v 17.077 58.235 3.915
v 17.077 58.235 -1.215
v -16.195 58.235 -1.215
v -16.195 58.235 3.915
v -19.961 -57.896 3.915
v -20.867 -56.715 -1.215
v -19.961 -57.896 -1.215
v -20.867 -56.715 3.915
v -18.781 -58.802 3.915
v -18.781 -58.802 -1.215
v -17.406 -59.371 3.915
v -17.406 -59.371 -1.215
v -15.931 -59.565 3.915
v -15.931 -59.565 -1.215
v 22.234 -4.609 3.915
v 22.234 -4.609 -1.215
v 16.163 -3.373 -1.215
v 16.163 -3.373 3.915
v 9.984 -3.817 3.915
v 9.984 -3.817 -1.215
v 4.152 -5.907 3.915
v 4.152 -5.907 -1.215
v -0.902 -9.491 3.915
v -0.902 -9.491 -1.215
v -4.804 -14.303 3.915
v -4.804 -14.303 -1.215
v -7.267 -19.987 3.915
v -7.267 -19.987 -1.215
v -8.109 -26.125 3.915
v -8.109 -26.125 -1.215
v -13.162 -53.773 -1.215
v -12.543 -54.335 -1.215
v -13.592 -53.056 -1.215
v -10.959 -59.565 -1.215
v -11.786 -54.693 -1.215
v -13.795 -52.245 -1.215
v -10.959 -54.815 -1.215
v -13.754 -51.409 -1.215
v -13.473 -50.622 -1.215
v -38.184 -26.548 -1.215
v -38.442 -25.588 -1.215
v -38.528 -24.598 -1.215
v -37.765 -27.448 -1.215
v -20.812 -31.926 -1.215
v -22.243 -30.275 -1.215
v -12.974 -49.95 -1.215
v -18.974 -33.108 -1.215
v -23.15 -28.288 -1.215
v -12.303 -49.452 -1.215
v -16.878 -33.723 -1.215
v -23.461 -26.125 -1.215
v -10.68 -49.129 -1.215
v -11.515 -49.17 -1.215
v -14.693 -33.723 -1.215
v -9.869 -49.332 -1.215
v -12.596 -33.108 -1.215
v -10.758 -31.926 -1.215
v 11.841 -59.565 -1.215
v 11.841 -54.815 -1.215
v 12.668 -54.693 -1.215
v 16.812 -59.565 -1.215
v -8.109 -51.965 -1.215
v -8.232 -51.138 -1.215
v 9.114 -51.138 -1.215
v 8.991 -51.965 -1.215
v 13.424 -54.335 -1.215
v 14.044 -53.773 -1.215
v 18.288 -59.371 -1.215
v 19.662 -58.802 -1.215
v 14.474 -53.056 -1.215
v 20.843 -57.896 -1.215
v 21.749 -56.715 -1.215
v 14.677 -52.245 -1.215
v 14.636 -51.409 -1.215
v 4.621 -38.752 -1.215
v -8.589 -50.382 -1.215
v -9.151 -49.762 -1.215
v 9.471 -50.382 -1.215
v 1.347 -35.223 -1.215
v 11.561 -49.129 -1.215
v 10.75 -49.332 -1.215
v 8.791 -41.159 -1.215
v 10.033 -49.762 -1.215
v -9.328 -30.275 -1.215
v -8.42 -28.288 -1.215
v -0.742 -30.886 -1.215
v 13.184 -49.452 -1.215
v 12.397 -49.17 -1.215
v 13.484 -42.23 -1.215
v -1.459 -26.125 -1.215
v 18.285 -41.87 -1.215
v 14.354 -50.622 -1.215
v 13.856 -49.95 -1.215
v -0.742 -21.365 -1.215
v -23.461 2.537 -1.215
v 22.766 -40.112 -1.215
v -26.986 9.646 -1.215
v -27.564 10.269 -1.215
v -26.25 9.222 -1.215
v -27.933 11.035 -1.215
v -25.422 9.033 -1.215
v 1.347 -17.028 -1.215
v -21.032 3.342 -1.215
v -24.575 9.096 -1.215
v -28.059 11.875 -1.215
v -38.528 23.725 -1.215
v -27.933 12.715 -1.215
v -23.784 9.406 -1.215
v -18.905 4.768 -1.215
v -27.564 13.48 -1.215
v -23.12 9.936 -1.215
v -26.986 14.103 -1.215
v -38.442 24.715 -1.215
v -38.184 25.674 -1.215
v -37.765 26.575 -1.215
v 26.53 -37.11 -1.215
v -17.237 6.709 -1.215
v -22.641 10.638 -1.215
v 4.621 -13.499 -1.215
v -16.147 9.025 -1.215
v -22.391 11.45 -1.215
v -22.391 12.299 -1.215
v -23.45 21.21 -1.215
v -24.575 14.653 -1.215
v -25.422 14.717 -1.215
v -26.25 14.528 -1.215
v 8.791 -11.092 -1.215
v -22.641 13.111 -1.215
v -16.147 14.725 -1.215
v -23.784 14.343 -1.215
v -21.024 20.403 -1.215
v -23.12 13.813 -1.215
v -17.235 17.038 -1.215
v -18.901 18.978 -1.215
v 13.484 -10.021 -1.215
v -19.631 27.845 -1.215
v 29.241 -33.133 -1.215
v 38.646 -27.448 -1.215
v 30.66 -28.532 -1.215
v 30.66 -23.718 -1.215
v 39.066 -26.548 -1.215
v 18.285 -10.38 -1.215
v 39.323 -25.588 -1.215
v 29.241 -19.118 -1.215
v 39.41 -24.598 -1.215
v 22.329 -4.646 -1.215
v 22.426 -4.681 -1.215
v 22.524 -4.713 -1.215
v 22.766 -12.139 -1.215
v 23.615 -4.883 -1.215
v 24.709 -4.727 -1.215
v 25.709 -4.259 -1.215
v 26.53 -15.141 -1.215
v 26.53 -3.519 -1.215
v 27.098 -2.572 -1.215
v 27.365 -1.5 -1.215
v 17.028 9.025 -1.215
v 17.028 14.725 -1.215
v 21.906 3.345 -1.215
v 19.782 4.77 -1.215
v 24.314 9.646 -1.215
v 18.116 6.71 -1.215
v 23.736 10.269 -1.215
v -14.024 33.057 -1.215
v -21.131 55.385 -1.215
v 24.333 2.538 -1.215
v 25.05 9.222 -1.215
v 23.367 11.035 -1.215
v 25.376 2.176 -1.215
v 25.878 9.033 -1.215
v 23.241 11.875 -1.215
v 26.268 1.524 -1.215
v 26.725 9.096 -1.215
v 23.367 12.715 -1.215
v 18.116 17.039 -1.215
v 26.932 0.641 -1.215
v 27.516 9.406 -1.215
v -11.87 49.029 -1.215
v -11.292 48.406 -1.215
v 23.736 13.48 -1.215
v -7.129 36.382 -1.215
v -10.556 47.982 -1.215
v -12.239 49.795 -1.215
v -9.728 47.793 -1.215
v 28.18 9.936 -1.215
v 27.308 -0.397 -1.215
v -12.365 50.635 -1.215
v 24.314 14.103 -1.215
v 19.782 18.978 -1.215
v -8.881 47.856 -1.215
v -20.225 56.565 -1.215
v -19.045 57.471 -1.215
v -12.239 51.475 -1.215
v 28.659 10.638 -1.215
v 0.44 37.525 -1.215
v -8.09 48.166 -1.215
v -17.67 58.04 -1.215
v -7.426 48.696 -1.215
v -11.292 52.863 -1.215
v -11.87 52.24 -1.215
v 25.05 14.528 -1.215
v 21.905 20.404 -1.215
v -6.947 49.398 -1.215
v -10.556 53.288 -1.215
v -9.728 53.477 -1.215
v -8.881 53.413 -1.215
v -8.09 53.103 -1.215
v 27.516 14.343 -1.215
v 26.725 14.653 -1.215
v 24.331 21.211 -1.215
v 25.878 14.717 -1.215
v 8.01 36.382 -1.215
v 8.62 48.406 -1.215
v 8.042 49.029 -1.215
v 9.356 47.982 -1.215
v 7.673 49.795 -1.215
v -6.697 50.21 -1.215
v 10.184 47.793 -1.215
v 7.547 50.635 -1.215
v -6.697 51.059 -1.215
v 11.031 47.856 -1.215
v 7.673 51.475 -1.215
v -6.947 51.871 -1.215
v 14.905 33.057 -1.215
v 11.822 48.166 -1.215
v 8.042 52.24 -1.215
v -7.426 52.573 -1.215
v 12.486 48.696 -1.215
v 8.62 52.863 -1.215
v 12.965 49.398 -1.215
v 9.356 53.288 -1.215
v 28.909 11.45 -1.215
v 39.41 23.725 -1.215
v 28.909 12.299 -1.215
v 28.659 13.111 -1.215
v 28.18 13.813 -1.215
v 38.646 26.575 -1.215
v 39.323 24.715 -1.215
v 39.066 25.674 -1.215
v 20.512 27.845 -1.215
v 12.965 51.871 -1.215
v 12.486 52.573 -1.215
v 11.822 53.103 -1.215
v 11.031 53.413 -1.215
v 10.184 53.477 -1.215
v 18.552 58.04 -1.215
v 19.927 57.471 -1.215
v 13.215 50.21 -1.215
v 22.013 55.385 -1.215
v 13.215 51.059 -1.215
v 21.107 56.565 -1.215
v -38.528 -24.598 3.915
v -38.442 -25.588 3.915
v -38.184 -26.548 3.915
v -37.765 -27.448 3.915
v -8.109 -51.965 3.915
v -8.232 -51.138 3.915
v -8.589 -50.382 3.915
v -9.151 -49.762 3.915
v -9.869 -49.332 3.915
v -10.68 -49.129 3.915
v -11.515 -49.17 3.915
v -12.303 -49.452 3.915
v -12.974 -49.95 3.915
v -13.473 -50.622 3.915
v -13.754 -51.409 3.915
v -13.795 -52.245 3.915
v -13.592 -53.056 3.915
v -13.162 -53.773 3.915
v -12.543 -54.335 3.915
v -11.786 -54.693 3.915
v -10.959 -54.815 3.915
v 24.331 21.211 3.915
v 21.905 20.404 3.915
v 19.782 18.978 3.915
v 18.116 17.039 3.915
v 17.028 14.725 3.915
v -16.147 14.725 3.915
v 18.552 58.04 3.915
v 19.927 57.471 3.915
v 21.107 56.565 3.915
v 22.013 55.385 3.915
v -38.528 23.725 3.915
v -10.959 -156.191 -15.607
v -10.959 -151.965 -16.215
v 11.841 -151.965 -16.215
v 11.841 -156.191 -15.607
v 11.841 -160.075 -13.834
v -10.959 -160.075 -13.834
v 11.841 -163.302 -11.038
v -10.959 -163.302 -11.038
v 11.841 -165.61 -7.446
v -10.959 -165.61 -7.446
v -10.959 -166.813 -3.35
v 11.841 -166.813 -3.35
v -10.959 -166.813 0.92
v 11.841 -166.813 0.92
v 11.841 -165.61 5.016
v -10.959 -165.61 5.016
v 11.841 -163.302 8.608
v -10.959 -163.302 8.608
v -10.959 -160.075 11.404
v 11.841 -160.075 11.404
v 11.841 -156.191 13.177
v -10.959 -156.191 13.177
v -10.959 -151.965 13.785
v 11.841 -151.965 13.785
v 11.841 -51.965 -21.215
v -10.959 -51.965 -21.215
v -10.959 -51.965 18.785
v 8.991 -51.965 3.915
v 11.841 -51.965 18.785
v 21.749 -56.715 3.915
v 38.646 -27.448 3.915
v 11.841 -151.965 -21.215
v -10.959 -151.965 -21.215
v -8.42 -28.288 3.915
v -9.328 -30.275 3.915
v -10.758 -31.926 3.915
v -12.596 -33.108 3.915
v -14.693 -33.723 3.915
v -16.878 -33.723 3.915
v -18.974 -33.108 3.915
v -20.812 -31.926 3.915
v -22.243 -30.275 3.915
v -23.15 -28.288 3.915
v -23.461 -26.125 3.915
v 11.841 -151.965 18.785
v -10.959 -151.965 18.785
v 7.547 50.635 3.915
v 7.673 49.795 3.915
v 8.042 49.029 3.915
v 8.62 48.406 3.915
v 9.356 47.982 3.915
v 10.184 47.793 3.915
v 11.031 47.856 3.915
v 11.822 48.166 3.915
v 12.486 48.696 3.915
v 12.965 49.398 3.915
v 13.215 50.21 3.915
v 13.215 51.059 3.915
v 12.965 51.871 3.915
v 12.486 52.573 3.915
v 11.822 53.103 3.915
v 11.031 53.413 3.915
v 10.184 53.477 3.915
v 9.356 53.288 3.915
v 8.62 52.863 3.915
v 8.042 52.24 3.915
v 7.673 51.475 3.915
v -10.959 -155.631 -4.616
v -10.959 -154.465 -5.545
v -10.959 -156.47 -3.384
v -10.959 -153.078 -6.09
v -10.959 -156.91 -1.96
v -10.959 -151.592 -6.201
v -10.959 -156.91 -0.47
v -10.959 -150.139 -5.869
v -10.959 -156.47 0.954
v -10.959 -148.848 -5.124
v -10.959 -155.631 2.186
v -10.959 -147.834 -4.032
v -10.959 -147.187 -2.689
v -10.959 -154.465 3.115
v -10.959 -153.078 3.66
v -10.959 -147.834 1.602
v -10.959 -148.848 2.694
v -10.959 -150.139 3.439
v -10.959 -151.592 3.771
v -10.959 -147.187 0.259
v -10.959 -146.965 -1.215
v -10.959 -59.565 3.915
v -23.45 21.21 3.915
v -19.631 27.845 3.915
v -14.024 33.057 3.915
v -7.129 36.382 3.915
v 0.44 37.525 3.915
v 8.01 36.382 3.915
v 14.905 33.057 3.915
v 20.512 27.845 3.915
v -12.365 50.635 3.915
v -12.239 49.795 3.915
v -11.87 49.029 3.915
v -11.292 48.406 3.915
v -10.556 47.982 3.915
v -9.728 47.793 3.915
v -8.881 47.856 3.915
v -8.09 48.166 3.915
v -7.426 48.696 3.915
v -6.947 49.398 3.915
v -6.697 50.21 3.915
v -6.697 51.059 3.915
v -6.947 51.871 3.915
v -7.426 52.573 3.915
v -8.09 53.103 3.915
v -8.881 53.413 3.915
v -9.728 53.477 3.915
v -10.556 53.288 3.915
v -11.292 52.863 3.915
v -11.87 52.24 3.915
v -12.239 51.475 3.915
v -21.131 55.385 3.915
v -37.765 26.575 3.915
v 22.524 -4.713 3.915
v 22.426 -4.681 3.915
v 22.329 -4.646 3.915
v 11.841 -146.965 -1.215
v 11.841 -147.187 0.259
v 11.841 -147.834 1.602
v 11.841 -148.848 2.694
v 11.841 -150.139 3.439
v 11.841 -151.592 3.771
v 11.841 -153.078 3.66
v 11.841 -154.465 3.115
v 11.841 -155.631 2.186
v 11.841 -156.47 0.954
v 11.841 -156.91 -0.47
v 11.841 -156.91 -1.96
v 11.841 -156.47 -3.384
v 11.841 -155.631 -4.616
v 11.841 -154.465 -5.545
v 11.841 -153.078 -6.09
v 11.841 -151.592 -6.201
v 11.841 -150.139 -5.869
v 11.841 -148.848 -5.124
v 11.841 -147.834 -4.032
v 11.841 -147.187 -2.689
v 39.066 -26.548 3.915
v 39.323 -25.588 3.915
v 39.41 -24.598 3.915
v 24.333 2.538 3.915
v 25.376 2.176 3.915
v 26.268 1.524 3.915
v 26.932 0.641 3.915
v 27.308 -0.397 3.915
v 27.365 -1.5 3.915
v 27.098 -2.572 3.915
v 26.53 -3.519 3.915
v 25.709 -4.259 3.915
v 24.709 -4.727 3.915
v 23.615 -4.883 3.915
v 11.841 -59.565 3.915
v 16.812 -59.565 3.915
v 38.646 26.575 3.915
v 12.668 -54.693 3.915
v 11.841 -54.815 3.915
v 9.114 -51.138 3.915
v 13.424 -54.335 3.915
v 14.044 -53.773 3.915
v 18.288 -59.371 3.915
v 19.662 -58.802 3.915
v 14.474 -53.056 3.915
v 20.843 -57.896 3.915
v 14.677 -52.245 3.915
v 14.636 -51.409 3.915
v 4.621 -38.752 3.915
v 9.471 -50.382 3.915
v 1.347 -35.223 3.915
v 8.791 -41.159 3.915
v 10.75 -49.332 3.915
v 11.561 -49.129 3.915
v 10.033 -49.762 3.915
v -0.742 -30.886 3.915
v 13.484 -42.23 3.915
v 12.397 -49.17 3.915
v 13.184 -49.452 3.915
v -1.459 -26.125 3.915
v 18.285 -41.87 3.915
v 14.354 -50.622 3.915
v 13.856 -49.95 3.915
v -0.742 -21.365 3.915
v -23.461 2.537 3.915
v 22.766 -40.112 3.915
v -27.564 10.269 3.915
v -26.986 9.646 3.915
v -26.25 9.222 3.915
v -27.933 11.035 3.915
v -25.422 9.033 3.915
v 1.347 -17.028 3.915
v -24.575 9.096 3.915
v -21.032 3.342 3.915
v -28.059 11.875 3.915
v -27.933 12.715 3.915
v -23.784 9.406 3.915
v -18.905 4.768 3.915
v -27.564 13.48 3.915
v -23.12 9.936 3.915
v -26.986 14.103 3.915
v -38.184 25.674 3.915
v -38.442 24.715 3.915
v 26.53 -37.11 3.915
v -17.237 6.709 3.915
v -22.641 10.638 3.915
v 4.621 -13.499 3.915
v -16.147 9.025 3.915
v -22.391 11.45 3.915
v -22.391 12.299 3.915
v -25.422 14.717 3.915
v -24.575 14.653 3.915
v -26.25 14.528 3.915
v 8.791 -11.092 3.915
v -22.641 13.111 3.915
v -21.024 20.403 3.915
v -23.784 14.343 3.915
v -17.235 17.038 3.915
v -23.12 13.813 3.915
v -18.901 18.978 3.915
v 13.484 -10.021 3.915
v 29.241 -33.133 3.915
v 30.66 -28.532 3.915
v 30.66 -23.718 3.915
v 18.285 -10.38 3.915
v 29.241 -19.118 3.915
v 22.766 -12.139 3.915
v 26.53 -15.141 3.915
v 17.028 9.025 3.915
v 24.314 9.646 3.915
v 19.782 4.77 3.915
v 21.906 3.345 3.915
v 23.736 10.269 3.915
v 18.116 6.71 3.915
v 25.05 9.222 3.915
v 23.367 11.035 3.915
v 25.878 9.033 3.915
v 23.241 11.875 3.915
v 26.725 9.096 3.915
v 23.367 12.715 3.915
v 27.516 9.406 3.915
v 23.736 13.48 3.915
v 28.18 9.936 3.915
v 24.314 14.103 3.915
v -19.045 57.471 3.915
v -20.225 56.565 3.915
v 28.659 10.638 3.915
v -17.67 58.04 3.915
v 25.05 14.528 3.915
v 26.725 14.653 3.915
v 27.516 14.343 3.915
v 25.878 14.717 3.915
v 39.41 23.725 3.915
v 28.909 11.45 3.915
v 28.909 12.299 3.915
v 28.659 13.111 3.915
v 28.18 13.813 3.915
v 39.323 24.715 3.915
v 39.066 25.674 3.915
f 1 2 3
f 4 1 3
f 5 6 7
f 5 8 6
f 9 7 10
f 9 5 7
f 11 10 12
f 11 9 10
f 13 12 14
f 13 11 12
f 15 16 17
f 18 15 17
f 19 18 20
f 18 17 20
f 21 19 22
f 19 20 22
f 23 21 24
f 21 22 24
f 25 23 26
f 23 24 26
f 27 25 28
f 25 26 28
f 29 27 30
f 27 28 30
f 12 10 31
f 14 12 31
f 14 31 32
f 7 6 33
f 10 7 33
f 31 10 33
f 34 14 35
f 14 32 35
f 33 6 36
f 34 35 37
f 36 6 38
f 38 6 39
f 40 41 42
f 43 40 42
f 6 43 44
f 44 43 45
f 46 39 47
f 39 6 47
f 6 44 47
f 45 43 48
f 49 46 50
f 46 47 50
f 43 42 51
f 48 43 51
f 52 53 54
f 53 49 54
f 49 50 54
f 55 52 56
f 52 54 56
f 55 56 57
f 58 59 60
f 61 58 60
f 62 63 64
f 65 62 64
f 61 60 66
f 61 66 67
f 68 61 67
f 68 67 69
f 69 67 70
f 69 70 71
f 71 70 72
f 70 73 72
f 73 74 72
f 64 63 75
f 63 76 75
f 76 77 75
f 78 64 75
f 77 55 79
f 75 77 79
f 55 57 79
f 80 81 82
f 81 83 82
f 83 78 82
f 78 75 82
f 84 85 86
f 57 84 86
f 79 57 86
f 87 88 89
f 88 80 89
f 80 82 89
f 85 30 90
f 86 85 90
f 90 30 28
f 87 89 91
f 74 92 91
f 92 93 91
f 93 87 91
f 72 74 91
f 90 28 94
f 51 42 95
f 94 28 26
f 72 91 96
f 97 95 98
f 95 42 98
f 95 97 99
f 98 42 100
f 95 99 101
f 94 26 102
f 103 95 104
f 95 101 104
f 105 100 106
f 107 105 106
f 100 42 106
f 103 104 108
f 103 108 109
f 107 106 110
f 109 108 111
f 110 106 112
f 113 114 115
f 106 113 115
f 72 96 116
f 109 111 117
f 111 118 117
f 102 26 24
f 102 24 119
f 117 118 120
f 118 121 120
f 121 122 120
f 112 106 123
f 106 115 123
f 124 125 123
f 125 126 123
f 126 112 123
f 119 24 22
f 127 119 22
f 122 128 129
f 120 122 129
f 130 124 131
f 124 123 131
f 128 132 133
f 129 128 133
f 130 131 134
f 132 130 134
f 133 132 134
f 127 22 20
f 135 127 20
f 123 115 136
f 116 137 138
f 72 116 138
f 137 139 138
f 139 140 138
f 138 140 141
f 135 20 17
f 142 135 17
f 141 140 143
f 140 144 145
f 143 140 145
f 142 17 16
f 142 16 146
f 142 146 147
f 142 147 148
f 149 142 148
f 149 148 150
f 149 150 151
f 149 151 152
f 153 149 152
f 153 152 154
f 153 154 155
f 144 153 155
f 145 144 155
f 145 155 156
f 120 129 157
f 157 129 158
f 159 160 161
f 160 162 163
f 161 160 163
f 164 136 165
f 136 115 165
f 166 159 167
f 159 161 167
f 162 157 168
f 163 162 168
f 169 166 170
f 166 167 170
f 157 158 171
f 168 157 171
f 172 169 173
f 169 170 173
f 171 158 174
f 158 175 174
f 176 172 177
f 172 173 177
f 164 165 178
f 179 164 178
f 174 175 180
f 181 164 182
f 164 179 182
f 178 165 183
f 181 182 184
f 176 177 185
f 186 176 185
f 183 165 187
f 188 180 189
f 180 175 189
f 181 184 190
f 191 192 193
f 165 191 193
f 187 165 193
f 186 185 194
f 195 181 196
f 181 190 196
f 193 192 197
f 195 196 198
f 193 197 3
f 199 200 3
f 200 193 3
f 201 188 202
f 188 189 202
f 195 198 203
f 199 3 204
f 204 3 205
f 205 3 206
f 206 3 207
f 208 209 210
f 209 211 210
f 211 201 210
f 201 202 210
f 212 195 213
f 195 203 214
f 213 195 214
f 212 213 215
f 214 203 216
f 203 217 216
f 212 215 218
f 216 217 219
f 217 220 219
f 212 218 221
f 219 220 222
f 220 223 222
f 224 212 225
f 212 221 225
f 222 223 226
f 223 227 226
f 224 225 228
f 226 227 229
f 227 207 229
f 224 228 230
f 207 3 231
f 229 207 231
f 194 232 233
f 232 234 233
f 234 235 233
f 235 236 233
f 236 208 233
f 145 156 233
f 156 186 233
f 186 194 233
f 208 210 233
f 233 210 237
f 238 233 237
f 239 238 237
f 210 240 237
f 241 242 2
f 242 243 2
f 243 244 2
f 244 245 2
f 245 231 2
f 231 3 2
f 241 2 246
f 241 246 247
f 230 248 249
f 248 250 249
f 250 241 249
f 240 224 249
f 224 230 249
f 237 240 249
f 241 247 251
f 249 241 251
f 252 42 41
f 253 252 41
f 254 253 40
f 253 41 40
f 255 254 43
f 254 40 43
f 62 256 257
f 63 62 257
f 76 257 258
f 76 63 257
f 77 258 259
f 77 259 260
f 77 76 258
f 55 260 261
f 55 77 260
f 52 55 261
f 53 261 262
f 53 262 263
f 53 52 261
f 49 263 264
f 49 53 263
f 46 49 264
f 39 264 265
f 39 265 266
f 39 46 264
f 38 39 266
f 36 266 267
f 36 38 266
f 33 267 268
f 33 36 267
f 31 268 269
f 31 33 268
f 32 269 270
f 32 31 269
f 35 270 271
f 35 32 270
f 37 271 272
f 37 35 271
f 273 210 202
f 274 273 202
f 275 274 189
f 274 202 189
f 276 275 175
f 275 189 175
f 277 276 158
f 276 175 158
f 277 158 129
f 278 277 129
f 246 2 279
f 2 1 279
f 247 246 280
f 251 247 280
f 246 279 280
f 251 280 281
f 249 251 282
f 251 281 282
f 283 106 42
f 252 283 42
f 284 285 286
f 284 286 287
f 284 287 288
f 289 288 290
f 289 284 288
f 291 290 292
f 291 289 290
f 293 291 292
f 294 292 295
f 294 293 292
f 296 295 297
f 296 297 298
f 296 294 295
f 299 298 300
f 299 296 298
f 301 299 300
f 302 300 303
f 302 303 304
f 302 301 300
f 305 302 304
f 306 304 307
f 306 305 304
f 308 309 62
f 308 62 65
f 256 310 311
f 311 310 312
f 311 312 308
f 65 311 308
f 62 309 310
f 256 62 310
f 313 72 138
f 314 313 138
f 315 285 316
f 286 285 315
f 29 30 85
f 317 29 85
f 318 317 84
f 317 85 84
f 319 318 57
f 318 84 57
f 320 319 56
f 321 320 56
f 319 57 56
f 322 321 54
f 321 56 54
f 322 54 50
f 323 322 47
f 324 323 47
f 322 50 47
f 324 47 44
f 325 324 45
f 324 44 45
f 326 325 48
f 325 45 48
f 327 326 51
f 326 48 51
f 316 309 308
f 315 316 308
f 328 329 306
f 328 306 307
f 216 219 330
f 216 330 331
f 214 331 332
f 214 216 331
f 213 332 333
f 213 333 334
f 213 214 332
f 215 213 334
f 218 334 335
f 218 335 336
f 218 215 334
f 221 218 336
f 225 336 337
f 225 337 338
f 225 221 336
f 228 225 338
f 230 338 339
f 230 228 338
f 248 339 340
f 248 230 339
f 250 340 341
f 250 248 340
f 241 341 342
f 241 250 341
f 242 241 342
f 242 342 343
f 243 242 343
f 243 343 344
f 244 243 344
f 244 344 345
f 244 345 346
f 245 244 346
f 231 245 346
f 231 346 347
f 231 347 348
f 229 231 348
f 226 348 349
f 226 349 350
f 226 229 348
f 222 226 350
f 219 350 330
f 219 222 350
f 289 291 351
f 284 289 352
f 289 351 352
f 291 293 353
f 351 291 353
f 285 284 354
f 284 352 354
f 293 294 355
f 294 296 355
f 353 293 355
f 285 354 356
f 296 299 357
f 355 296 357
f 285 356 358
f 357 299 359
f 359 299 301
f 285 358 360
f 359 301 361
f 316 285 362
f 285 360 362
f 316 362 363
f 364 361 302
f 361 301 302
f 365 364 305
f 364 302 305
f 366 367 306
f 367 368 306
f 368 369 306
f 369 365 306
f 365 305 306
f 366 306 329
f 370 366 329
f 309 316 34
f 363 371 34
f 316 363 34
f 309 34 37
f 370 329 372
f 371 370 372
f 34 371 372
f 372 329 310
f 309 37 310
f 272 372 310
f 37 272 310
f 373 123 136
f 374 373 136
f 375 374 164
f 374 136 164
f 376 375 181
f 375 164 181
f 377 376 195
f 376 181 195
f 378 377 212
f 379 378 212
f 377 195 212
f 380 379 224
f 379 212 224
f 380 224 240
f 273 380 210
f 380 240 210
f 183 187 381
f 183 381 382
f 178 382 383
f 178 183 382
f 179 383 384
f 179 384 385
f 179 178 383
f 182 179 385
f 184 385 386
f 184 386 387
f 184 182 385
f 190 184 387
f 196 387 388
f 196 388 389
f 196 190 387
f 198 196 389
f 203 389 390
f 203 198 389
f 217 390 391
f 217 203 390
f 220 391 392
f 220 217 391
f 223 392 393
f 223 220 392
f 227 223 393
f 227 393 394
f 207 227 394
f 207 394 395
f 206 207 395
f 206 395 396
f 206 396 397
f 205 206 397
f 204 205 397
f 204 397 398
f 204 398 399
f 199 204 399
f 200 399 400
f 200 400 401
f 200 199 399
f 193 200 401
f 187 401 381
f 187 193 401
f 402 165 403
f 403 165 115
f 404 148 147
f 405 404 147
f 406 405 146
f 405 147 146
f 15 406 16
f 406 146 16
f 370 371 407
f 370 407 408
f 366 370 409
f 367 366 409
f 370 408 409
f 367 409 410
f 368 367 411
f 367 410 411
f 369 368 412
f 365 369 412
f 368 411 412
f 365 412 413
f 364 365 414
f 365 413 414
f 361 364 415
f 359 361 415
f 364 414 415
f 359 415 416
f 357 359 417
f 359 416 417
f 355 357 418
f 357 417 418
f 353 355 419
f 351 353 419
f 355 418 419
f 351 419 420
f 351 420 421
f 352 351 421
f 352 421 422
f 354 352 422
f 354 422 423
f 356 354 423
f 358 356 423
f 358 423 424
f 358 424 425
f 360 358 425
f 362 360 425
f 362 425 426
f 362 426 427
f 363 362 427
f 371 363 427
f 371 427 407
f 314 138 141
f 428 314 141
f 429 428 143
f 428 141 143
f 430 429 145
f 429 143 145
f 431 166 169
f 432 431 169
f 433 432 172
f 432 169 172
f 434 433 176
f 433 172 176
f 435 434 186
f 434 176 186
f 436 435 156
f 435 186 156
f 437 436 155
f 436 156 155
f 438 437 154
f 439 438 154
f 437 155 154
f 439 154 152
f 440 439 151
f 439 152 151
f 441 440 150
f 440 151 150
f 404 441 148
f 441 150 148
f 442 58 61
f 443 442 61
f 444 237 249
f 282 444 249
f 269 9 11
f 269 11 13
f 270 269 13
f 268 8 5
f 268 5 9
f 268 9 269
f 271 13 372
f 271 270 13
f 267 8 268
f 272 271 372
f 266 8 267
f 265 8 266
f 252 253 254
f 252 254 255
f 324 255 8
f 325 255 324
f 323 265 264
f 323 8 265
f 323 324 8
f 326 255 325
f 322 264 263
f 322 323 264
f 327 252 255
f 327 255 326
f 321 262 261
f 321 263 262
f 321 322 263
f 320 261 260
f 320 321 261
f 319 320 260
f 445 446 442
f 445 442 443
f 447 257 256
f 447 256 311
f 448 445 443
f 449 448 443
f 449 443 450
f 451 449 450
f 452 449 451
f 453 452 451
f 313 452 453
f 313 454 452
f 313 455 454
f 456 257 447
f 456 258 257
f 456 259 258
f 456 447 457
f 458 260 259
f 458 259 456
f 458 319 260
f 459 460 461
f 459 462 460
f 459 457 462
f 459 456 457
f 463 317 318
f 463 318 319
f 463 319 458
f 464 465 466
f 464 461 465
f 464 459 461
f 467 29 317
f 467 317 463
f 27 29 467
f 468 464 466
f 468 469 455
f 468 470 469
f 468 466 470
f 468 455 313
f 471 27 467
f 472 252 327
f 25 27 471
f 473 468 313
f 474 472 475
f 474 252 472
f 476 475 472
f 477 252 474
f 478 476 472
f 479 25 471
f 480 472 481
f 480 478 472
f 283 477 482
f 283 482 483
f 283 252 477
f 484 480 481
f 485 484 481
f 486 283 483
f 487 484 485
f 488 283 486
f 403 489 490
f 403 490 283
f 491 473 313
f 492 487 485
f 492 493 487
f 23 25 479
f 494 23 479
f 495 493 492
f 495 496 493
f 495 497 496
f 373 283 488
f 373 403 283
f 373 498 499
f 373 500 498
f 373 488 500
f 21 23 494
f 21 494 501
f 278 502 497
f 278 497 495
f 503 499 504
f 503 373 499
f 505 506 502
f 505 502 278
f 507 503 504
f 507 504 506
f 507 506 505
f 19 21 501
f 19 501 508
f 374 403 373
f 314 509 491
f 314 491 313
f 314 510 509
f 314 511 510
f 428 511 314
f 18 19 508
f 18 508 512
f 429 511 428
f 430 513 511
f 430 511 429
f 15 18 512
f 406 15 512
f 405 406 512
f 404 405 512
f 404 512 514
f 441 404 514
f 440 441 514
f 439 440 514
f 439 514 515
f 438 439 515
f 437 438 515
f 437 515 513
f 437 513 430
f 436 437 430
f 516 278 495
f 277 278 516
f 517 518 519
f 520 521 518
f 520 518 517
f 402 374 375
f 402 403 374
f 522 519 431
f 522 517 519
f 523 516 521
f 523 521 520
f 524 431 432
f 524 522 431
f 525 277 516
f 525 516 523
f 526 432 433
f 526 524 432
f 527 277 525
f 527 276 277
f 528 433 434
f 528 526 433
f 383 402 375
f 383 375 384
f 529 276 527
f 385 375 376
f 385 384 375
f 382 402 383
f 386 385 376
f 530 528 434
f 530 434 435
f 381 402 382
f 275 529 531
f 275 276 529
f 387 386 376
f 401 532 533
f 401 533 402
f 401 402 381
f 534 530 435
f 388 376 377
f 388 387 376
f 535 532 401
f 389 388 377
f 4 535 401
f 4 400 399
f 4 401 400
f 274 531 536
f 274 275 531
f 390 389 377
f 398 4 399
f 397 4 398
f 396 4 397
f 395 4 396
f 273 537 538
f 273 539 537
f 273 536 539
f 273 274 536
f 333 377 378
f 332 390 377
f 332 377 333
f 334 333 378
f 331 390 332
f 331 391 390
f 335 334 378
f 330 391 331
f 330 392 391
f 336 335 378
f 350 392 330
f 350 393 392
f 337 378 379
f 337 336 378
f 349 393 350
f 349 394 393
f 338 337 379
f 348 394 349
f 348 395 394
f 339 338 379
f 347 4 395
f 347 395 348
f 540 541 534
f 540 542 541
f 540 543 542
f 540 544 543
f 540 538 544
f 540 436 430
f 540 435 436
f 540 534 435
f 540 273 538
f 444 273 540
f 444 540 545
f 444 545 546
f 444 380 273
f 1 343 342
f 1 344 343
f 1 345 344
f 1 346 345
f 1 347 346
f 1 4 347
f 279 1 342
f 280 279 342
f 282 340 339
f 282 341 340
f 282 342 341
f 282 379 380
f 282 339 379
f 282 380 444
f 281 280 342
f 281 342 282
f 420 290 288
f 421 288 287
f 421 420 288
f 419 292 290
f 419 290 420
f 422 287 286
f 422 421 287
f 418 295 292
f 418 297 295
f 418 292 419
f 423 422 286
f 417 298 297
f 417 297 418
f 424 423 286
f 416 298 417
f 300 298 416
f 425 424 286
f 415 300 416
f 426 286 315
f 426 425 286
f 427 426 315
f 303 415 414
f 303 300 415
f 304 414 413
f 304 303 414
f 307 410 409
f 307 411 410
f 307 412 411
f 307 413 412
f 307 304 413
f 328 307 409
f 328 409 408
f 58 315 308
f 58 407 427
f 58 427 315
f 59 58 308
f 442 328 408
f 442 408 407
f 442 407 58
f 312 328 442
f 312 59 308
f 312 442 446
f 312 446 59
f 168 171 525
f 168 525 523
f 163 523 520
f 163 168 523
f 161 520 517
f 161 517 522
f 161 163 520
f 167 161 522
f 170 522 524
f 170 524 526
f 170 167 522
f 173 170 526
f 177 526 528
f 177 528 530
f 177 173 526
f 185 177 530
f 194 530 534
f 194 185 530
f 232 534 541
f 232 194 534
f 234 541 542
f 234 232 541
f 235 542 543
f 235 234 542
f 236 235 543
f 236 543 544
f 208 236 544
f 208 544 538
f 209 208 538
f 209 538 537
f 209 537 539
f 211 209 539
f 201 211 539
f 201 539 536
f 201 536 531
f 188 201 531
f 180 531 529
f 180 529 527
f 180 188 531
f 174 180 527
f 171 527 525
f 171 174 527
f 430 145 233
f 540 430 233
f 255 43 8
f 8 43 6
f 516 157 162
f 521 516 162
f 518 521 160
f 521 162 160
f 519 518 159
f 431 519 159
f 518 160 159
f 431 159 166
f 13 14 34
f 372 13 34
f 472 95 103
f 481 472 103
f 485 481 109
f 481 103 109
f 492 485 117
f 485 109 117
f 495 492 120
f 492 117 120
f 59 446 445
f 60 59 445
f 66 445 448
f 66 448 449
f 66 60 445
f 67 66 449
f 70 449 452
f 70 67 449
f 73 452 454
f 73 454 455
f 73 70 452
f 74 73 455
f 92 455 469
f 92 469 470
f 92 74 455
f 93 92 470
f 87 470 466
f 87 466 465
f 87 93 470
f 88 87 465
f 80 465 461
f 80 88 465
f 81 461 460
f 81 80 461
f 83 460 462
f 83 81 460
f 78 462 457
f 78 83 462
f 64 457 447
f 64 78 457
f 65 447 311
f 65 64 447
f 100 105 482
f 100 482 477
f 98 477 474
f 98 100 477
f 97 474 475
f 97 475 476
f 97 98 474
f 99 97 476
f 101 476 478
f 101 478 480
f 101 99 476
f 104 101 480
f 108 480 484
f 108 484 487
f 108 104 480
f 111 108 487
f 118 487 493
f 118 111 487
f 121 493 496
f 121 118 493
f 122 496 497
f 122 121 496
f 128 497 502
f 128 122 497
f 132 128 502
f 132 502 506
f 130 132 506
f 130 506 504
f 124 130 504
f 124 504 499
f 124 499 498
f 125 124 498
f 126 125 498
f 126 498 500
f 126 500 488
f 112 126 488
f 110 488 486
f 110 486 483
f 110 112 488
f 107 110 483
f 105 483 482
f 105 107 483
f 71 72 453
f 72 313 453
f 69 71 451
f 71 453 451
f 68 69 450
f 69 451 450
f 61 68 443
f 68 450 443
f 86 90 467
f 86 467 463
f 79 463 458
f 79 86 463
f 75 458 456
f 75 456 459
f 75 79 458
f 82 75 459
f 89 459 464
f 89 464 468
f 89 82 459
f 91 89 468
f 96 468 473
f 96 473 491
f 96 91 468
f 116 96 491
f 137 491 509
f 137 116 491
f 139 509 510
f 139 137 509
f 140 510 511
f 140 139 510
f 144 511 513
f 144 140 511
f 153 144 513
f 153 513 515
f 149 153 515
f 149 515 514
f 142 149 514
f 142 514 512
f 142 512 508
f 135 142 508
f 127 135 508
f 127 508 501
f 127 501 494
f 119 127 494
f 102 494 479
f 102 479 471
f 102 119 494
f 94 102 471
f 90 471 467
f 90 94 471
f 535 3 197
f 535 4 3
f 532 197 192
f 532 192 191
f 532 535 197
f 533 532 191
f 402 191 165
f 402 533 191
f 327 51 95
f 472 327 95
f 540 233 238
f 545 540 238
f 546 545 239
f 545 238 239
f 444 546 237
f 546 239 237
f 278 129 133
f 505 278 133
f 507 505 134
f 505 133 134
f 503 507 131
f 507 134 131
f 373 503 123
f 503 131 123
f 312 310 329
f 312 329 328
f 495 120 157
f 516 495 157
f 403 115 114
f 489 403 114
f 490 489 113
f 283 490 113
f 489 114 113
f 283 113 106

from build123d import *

# Parameters (mm, degrees)
SKETCH1_R           = 1.5
SKETCH1_R_2         = 8.5
BOSS_EXTRUDE1_DEPTH = 2.7
FILLET1_R           = 3
SCALE1_SCALE        = 1.9
BOSS_EXTRUDE2_START = -5.13
SKETCH2_W           = 22.8
SKETCH2_H           = 100
BOSS_EXTRUDE2_DEPTH = 20
SKETCH3_R           = 15
BOSS_EXTRUDE3_DEPTH = 22.8
CUT_EXTRUDE1_REACH  = 177.683
SKETCH4_R           = 5


with BuildPart() as part:
    # Sketch1 → Boss-Extrude1 (new body)
    with BuildSketch(Plane.XY):
        with BuildLine():
            Line((10.487675588, 31), (-10.487675588, 31))
            Line((-10.487675588, 31), (-20.108076211, 14.336977332))
            ThreePointArc((-20.108076211, 14.336977332), (-20.407777479, 13.613434467), (-20.51, 12.836977332))
            Line((-20.51, 12.836977332), (-20.51, -12.596152423))
            ThreePointArc((-20.51, -12.596152423), (-20.407777479, -13.372609558), (-20.108076211, -14.096152423))
            Line((-20.108076211, -14.096152423), (-10.348635262, -31))
            Line((-10.348635262, -31), (10.348635262, -31))
            Line((10.348635262, -31), (20.108076211, -14.096152423))
            ThreePointArc((20.108076211, -14.096152423), (20.407777479, -13.372609558), (20.51, -12.596152423))
            Line((20.51, -12.596152423), (20.51, 12.836977332))
            ThreePointArc((20.51, 12.836977332), (20.407777479, 13.613434467), (20.108076211, 14.336977332))
            Line((20.108076211, 14.336977332), (10.487675588, 31))
        make_face()
        with Locations(Location((-6, -27, 0), (0, 0, 180))):
            Circle(SKETCH1_R, mode=Mode.SUBTRACT)
        with Locations(Location((6, -27, 0), (0, 0, 180))):
            Circle(SKETCH1_R, mode=Mode.SUBTRACT)
        with Locations(Location((7.5, -13.4, 0), (0, 0, 180))):
            Circle(SKETCH1_R_2, mode=Mode.SUBTRACT)
        with BuildLine():
            ThreePointArc((-4.5, -13.4), (-8.54, -17.44), (-12.58, -13.4))
            Line((-12.58, -13.4), (-12.58, 1.685368783))
            ThreePointArc((-12.58, 1.685368783), (-10.18215631, 2.859423407), (-8.730303993, 5.1))
            Line((-8.730303993, 5.1), (8.729875369, 5.1))
            ThreePointArc((8.729875369, 5.1), (10.179804764, 2.860963681), (12.574584064, 1.685969643))
            ThreePointArc((12.574584064, 1.685969643), (14.121431526, -0.726790857), (11.622623122, -2.13039581))
            ThreePointArc((11.622623122, -2.13039581), (11.545720037, -2.104624526), (11.469942926, -2.075709596))
            ThreePointArc((11.469942926, -2.075709596), (0.558793877, -3.611248417), (-4.5, -13.4))
        make_face(mode=Mode.SUBTRACT)
        with Locations(Location((-13.5, 6.6, 0), (0, 0, 180))):
            Circle(SKETCH1_R, mode=Mode.SUBTRACT)
        with BuildLine():
            Line((8.729875369, 8.1), (-8.730303993, 8.1))
            ThreePointArc((-8.730303993, 8.1), (-10.179901517, 10.338575405), (-12.574074074, 11.513518208))
            ThreePointArc((-12.574074074, 11.513518208), (-0.00020804, 20.099999998), (12.57392263, 11.513905748))
            ThreePointArc((12.57392263, 11.513905748), (10.179553129, 10.338812856), (8.729875369, 8.1))
        make_face(mode=Mode.SUBTRACT)
        with Locations(Location((-5.24, 27, 0), (0, 0, 180))):
            Circle(SKETCH1_R, mode=Mode.SUBTRACT)
        with Locations(Location((13.5, 6.6, 0), (0, 0, 180))):
            Circle(SKETCH1_R, mode=Mode.SUBTRACT)
        with Locations(Location((5.24, 27, 0), (0, 0, 180))):
            Circle(SKETCH1_R, mode=Mode.SUBTRACT)
    extrude(amount=BOSS_EXTRUDE1_DEPTH)

    # Fillet1
    fillet1_edges = [part.edges().sort_by_distance(p)[0] for p in [
        (-10.487675588, 31, 1.35),
        (10.487675588, 31, 1.35),
        (10.348635262, -31, 1.35),
        (-10.348635262, -31, 1.35),
    ]]
    fillet(fillet1_edges, radius=FILLET1_R)


with BuildPart() as part_1:
    # Scale1: scaled about (-0.489793852, 0.73928426, 1.35)
    add(part.part.scale(SCALE1_SCALE).moved(Location((0.440814467, -0.665355834, -1.215))))

    # Sketch2 → Boss-Extrude2 (add, symmetric)
    with BuildSketch(Plane.XY.offset(3.915).offset(BOSS_EXTRUDE2_START)):
        with Locations((0.440814467, -101.965355834)):
            Rectangle(SKETCH2_W, SKETCH2_H)
    extrude(amount=BOSS_EXTRUDE2_DEPTH, both=True)

    # Sketch3 → Boss-Extrude3 (add)
    with BuildSketch(Plane.ZY.offset(10.959185533)):
        with Locations((-1.215, -151.965355834)):
            Circle(SKETCH3_R)
    extrude(amount=-BOSS_EXTRUDE3_DEPTH)

    # Sketch4 → Cut-Extrude1 (cut, up to next)
    with BuildSketch(Plane(origin=(11.840814467, 0, 0), x_dir=(0, 0, -1), z_dir=(1, 0, 0)), mode=Mode.PRIVATE) as cut_extrude1_sk1:
        with Locations(Location((1.215, -151.965355834, 0), (0, 0, 90))):
            Circle(SKETCH4_R)
    cut_extrude1_tool1 = extrude(cut_extrude1_sk1.sketch, amount=-CUT_EXTRUDE1_REACH, mode=Mode.PRIVATE) & part_1.part
    add(cut_extrude1_tool1.solids().sort_by_distance((11.840814, -151.965356, -1.215))[0], mode=Mode.SUBTRACT)


solid = part_1.part
